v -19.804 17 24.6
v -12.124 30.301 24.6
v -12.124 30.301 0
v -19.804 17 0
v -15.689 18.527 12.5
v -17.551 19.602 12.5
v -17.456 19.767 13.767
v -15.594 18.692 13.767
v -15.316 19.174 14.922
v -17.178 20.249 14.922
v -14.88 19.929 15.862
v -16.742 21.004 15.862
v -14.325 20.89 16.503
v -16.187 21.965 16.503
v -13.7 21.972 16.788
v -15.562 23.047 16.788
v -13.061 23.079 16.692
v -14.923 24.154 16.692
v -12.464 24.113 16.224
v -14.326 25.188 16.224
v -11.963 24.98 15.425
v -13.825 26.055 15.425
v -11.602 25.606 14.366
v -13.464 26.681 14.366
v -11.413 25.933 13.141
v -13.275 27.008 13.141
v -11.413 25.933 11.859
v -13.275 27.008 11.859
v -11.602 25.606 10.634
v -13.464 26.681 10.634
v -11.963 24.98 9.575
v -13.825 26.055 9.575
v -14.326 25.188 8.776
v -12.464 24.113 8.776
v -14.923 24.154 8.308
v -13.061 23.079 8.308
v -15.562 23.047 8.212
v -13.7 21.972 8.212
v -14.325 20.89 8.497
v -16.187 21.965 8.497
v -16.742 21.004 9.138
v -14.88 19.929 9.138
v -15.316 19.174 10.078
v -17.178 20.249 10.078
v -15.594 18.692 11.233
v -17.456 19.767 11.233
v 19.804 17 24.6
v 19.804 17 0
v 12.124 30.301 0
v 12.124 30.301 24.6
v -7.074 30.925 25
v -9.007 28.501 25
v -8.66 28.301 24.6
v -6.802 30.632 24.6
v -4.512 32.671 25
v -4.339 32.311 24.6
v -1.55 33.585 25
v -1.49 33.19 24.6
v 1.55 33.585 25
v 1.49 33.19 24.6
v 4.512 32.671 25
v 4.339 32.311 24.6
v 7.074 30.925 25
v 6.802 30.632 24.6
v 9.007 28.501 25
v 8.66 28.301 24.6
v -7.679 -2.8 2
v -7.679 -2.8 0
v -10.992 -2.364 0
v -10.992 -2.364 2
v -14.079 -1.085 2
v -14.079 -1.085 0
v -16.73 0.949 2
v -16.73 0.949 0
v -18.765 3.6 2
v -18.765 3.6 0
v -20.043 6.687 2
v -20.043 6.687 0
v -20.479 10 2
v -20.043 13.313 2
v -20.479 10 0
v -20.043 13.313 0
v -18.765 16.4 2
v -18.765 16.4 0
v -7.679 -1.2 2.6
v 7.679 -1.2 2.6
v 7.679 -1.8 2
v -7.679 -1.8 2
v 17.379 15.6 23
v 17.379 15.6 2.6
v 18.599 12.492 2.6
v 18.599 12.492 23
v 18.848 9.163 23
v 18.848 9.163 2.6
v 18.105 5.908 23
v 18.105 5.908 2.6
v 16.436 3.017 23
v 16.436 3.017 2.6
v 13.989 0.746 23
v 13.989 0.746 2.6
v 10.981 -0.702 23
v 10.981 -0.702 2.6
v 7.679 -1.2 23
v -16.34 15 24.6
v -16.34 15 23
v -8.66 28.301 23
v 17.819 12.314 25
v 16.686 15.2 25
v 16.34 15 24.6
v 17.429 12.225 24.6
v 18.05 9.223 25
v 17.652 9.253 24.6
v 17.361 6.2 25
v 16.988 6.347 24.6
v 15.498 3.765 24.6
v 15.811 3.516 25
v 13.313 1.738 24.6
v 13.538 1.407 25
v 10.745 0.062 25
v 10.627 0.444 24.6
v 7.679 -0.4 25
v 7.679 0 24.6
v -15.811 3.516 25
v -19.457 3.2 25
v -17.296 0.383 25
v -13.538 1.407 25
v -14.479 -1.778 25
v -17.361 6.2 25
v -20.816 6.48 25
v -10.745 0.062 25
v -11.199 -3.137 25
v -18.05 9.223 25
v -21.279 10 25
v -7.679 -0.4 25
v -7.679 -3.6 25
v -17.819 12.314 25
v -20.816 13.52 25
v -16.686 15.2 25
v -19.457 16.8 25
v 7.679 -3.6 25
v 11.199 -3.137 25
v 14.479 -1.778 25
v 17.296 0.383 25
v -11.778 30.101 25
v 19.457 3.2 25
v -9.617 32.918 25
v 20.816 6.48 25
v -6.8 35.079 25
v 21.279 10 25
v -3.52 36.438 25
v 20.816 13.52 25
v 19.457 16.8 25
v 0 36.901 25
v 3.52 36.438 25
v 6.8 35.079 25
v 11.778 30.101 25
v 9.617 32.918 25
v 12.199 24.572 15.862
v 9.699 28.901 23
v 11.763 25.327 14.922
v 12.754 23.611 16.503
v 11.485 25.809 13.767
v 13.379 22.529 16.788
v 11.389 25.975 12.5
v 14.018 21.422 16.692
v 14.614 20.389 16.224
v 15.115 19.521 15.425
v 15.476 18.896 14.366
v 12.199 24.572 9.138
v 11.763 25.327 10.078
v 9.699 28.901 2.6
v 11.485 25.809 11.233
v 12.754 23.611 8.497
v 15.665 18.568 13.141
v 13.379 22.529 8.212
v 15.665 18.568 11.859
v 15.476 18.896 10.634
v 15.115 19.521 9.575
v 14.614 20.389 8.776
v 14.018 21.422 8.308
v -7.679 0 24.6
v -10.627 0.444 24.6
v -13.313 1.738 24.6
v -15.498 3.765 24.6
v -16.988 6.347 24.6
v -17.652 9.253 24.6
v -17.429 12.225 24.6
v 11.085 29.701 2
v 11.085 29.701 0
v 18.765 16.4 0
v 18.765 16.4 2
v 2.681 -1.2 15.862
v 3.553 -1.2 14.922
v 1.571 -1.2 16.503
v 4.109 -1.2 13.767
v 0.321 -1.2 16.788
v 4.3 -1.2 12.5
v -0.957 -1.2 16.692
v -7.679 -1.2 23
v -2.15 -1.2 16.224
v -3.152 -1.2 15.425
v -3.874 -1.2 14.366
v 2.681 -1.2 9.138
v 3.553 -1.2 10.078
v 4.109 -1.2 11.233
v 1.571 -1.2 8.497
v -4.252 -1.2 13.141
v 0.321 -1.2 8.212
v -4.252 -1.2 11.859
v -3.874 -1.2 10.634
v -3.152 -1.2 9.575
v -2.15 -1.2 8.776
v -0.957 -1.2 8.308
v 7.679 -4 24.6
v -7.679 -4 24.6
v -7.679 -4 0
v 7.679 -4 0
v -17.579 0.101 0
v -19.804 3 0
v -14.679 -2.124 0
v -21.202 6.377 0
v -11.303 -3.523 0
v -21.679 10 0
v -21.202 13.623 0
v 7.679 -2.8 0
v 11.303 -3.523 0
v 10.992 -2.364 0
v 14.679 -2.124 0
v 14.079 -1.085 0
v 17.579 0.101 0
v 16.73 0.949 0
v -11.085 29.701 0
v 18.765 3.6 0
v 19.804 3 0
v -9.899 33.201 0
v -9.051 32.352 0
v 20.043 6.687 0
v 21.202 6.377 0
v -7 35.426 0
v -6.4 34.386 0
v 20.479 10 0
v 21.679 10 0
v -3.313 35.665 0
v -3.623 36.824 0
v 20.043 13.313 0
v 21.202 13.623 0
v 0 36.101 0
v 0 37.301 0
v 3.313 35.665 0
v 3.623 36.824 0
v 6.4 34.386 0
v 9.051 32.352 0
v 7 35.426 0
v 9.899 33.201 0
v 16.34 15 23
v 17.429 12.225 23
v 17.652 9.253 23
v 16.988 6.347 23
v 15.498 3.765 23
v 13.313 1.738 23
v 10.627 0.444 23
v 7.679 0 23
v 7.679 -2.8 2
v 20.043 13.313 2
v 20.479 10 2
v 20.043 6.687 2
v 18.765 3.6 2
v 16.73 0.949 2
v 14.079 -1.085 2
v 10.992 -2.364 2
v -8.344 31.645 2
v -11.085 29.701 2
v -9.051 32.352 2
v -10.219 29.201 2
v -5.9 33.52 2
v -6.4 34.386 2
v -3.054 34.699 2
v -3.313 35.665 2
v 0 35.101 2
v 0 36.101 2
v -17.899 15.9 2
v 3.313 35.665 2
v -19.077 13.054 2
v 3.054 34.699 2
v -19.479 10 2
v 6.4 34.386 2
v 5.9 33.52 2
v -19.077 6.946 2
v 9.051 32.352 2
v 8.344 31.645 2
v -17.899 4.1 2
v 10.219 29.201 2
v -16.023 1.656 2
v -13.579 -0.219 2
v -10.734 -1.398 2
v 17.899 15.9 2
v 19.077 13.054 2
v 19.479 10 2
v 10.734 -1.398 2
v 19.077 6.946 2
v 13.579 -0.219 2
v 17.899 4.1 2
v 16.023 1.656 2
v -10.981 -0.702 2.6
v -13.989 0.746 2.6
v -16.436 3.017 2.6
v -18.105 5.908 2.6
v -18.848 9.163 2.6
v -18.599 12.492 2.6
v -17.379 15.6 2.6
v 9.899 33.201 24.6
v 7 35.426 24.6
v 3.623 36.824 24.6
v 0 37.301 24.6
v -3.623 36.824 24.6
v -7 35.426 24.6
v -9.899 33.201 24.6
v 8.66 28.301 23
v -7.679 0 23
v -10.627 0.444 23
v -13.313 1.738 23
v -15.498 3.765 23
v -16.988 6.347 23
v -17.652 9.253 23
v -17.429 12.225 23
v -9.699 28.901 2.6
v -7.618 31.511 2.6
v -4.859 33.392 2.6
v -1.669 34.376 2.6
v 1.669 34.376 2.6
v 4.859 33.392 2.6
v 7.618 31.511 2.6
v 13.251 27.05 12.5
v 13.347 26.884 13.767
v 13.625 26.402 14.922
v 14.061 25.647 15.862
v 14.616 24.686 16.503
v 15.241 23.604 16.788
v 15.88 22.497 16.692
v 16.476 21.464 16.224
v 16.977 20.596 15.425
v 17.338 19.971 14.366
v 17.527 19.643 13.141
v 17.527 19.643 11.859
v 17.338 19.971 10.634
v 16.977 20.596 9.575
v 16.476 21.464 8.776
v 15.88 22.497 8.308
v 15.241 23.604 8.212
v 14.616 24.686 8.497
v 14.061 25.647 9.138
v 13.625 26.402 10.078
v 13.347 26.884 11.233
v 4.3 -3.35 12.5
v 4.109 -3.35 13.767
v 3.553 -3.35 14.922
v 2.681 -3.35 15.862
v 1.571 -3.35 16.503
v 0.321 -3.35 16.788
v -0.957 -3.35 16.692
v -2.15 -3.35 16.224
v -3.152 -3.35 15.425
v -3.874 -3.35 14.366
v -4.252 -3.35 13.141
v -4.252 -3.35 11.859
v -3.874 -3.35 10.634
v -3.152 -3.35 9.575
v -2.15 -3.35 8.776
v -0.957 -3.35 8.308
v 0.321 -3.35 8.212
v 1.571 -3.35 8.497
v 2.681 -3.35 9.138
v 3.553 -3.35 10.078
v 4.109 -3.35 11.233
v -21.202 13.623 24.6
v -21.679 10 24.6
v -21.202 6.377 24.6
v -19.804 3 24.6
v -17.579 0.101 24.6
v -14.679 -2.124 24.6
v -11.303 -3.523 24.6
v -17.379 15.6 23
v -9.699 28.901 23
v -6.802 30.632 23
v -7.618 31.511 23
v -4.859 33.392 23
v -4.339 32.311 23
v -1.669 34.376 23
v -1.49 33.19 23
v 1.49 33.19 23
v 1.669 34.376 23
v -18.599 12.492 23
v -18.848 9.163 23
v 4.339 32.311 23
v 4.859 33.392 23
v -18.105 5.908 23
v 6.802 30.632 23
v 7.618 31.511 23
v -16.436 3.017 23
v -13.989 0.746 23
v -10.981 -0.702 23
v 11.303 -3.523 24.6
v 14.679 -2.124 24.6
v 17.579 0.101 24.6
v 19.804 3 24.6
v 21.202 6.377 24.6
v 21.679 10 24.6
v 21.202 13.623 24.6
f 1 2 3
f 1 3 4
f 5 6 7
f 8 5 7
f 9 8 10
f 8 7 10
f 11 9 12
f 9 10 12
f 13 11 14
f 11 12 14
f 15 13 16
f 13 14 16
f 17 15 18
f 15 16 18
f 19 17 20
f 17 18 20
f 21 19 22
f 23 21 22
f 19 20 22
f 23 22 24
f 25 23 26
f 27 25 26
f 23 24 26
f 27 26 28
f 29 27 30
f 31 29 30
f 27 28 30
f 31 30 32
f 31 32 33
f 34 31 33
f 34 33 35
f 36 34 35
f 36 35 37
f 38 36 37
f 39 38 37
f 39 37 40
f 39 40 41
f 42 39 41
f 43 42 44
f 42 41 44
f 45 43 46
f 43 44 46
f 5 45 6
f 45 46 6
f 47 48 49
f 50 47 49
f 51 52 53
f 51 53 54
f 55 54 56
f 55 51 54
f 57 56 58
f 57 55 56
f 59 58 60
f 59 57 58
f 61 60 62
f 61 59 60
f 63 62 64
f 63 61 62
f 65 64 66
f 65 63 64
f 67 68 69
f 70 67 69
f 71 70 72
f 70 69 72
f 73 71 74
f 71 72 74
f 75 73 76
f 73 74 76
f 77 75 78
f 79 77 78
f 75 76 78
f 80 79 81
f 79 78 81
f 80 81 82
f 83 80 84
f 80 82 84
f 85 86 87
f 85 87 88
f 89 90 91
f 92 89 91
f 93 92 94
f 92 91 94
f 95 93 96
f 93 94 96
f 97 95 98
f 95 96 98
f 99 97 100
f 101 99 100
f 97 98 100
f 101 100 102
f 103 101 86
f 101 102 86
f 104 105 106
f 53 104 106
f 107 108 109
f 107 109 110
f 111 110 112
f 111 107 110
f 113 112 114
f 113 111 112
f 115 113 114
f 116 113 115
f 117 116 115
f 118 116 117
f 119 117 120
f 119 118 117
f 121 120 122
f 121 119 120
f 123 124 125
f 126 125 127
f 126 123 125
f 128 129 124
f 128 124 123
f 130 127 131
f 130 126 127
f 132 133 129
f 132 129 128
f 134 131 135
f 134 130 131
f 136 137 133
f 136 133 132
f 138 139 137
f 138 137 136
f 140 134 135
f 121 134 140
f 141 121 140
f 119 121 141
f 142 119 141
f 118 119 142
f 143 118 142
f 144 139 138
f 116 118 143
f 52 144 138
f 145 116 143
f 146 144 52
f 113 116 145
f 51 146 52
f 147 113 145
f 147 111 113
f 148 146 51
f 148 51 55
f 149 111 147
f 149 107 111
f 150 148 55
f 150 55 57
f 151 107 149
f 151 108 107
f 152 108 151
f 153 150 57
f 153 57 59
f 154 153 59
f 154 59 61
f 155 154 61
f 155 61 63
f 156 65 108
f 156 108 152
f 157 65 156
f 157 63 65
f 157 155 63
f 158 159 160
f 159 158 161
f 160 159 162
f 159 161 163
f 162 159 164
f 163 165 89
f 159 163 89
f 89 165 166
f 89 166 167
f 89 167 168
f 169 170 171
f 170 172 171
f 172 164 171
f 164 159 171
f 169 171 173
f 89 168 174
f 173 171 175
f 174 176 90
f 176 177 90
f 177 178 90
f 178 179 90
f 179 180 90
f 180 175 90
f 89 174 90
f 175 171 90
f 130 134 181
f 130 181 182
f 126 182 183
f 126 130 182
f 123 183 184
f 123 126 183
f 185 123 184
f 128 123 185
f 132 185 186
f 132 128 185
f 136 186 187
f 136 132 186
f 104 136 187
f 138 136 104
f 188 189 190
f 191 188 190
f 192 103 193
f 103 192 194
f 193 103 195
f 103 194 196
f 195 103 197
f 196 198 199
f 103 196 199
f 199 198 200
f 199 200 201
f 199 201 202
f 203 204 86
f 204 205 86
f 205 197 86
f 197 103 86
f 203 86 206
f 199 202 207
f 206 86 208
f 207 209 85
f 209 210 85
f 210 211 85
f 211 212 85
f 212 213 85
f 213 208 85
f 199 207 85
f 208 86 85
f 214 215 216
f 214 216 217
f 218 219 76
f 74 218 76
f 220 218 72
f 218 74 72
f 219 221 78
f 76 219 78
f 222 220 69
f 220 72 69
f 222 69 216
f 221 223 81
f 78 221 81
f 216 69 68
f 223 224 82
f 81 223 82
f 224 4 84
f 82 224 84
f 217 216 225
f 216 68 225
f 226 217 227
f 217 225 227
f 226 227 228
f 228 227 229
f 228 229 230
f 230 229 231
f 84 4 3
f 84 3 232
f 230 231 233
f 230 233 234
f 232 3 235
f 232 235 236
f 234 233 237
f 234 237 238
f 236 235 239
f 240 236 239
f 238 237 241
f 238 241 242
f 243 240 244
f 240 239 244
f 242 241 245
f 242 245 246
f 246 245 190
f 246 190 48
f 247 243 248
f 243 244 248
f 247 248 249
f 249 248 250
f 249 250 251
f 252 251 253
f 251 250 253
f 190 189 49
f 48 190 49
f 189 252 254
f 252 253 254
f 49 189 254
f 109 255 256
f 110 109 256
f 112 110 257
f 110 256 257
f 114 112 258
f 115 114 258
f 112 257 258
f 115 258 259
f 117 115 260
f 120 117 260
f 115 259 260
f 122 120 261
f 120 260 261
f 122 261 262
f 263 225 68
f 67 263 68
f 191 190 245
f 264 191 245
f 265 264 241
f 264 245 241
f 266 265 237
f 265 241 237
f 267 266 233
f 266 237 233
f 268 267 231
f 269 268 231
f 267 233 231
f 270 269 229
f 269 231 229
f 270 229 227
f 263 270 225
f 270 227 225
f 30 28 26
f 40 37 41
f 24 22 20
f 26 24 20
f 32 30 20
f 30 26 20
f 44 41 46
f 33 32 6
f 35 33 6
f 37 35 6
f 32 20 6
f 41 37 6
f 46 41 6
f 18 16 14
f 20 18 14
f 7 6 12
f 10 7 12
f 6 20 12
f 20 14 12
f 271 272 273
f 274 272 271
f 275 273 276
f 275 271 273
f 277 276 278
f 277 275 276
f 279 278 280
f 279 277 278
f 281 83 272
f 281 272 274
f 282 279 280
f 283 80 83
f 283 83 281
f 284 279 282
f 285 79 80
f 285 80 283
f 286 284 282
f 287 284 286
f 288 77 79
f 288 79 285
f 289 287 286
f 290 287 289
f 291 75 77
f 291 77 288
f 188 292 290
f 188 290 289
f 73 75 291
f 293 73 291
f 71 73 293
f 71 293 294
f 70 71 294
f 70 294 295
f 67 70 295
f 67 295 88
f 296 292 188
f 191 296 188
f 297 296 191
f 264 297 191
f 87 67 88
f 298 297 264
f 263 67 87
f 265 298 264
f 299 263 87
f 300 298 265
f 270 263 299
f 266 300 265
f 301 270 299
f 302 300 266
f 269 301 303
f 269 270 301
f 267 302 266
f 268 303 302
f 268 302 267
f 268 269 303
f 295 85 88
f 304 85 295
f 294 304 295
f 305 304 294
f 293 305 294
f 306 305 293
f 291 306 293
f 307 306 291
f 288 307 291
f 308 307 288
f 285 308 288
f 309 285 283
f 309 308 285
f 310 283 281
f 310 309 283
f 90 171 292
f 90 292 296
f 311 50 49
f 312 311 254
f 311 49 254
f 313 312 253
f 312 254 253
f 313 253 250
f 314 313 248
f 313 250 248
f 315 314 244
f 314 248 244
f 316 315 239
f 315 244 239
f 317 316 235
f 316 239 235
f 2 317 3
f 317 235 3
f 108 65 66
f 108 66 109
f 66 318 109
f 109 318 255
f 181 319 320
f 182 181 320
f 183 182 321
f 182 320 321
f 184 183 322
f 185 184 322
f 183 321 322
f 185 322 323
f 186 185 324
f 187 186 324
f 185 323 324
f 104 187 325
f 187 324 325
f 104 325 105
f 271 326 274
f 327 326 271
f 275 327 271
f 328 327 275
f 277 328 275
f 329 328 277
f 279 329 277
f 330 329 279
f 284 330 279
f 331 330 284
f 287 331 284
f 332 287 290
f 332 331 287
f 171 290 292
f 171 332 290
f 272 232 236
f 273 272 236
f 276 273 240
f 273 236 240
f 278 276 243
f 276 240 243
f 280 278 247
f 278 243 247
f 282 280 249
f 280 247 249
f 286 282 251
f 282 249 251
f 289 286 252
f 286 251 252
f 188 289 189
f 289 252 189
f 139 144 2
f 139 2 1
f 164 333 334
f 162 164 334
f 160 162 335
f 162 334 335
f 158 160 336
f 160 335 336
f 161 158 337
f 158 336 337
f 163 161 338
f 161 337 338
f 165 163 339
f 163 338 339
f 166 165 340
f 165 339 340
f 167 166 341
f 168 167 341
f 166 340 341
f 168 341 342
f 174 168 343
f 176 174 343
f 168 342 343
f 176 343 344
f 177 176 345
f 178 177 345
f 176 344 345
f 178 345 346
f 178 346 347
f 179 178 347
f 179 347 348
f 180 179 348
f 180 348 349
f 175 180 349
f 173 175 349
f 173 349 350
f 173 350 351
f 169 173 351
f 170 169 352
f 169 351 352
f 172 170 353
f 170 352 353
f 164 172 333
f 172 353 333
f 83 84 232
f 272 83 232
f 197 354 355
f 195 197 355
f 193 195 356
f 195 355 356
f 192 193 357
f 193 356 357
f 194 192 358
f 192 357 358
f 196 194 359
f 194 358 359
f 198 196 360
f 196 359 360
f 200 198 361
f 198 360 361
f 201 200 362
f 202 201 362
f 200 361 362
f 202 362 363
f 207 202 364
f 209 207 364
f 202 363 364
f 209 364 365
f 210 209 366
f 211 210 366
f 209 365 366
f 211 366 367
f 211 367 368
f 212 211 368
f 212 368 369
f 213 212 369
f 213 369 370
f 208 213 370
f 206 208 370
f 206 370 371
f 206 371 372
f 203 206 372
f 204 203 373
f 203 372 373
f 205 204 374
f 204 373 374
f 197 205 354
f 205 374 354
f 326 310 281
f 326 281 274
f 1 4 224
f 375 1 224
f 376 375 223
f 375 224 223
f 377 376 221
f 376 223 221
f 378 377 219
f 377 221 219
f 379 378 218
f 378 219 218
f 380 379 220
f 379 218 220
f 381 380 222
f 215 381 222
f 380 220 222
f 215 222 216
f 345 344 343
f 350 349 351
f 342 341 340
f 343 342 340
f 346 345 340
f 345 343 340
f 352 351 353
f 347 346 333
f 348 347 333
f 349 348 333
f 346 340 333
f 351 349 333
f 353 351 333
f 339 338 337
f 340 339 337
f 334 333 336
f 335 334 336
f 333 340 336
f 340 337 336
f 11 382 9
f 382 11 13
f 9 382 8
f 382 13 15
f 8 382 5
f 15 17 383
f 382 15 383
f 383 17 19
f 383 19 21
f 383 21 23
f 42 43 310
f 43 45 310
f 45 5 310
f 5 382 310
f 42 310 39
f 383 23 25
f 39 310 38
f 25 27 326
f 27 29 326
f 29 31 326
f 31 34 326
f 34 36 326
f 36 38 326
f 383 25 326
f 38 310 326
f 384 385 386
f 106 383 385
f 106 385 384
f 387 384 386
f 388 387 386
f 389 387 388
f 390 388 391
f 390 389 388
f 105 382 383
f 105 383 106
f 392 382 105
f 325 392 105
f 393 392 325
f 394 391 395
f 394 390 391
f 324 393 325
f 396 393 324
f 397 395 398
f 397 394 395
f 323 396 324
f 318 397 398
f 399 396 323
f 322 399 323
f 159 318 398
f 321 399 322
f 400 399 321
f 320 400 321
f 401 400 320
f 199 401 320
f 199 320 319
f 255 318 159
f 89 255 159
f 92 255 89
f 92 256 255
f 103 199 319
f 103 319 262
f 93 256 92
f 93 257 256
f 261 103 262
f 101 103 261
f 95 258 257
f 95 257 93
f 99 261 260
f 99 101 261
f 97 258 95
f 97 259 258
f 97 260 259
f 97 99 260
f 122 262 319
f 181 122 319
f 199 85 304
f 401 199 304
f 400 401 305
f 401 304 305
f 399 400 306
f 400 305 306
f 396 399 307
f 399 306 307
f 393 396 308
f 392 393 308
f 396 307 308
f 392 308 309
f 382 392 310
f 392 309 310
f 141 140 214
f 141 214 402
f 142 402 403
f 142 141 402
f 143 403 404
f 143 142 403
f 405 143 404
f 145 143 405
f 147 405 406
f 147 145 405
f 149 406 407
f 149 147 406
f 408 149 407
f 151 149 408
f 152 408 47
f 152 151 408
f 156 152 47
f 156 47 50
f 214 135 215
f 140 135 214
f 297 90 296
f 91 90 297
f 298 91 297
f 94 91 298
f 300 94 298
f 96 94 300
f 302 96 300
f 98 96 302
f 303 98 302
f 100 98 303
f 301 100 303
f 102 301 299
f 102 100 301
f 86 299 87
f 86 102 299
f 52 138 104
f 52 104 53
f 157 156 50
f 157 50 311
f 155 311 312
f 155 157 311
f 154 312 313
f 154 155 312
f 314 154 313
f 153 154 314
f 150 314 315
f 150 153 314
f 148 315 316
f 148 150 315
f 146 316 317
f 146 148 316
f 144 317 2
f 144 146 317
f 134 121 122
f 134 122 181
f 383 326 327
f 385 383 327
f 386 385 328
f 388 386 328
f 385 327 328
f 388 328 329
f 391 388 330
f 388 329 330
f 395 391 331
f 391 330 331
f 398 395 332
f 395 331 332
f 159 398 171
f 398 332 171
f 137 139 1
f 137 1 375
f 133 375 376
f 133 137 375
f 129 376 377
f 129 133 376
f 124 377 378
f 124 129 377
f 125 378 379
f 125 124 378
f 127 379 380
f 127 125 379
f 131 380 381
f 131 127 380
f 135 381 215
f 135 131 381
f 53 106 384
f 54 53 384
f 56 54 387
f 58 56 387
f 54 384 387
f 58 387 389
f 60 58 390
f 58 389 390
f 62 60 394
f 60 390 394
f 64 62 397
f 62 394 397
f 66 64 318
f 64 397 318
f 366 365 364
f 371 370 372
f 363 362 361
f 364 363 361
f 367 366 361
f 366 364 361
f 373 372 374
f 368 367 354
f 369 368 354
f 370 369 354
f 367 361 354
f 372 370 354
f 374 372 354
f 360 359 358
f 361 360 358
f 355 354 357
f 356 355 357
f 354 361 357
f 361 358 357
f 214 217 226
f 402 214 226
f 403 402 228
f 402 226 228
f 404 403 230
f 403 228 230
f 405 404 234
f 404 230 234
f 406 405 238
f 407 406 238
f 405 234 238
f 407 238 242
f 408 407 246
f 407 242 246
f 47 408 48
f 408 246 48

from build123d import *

# Parameters (mm, degrees)
F1_DEPTH        = 25
F3_START        = -0.65
F2_R            = 4.3
F3_DEPTH        = 2.15
F3_COPIES_COUNT = 3
F6_DEPTH        = 23
F8_DEPTH        = 2
F9_SIZE         = 0.6
F10_SIZE        = 0.4


# Not quite as in the source:
# - a pattern or mirror of a feature is missing from the dataset's text; its kind, count and spacing are read off the source's solid


with BuildPart() as f1:
    # F0 (on Top) → F1 (new body)
    with BuildSketch(Plane.XY):
        with BuildLine():
            ThreePointArc((7.6794919243, -4), (19.8038475773, 3), (19.8038475773, 17))
            Line((19.8038475773, 17), (12.124355653, 30.3012701892))
            ThreePointArc((12.124355653, 30.3012701892), (0, 37.3012701892), (-12.124355653, 30.3012701892))
            Line((-12.124355653, 30.3012701892), (-19.8038475773, 17))
            ThreePointArc((-19.8038475773, 17), (-19.8038475773, 3), (-7.6794919243, -4))
            Line((-7.6794919243, -4), (0, -4))
            Line((0, -4), (7.6794919243, -4))
        make_face()
        with BuildLine():
            Line((7.6794919243, 0), (0, 0))
            Line((0, 0), (-7.6794919243, 0))
            ThreePointArc((-7.6794919243, 0), (-16.3397459622, 5), (-16.3397459622, 15))
            Line((-16.3397459622, 15), (-8.6602540378, 28.3012701892))
            ThreePointArc((-8.6602540378, 28.3012701892), (0, 33.3012701892), (8.6602540378, 28.3012701892))
            Line((8.6602540378, 28.3012701892), (16.3397459622, 15))
            ThreePointArc((16.3397459622, 15), (16.3397459622, 5), (7.6794919243, 0))
        make_face(mode=Mode.SUBTRACT)
    extrude(amount=F1_DEPTH)

    # F2 (on face) → F3 (cut)
    with BuildSketch(Plane(origin=(-22.2141016151, 12.8253175473, 0), x_dir=(-0.5, -0.8660254038, 0), z_dir=(-0.8660254038, 0.5, 0)).offset(F3_START)):
        with Locations((-12.5, 12.5)):
            Circle(F2_R)
    f3 = extrude(amount=-F3_DEPTH, mode=Mode.SUBTRACT)

    # F3_copies: F3 ×3 about axis
    f3_copies_axis = Axis((0, 14.433757, 0), (0, 0, 1))
    for i in range(1, F3_COPIES_COUNT):
        add(f3.rotate(f3_copies_axis, i * 360 / F3_COPIES_COUNT), mode=Mode.SUBTRACT)

    # F5 (on face) → F6 (cut)
    with BuildSketch(Plane(origin=(0, 0, 0), x_dir=(1, 0, 0), z_dir=(0, 0, -1))):
        with BuildLine():
            Line((9.6994845224, -28.9012701892), (17.3789764467, -15.6))
            ThreePointArc((17.3789764467, -15.6), (17.3789764467, -4.4), (7.6794919243, 1.2))
            Line((7.6794919243, 1.2), (-7.6794919243, 1.2))
            ThreePointArc((-7.6794919243, 1.2), (-17.3789764467, -4.4), (-17.3789764467, -15.6))
            Line((-17.3789764467, -15.6), (-9.6994845224, -28.9012701892))
            ThreePointArc((-9.6994845224, -28.9012701892), (0, -34.5012701892), (9.6994845224, -28.9012701892))
        make_face()
    extrude(amount=-F6_DEPTH, mode=Mode.SUBTRACT)

    # F7 (on face) → F8 (cut)
    with BuildSketch(Plane(origin=(0, 0, 0), x_dir=(1, 0, 0), z_dir=(0, 0, -1))):
        with BuildLine():
            Line((11.0851251684, -29.7012701892), (18.7646170928, -16.4))
            ThreePointArc((18.7646170928, -16.4), (18.7646170928, -3.6), (7.6794919243, 2.8))
            Line((7.6794919243, 2.8), (-7.6794919243, 2.8))
            ThreePointArc((-7.6794919243, 2.8), (-18.7646170928, -3.6), (-18.7646170928, -16.4))
            Line((-18.7646170928, -16.4), (-11.0851251684, -29.7012701892))
            ThreePointArc((-11.0851251684, -29.7012701892), (0, -36.1012701892), (11.0851251684, -29.7012701892))
        make_face()
    extrude(amount=-F8_DEPTH, mode=Mode.SUBTRACT)

    # F9
    f9_edges = [f1.edges().sort_by_distance(p)[0] for p in [
        (0, 34.50127, 2),
        (13.53923, 22.250635, 2),
        (17.378976, 4.4, 2),
        (0, -1.2, 2),
        (-17.378976, 4.4, 2),
        (-13.53923, 22.250635, 2),
    ]]
    chamfer(f9_edges, length=F9_SIZE)

    # F10
    f10_edges = [f1.edges().sort_by_distance(p)[0] for p in [
        (19.803848, 3, 25),
        (12.5, 21.650635, 25),
        (0, -4, 25),
        (-19.803848, 3, 25),
        (-15.964102, 23.650635, 25),
        (15.964102, 23.650635, 25),
        (0, 37.30127, 25),
        (16.339746, 5, 25),
        (0, 0, 25),
        (-16.339746, 5, 25),
        (-12.5, 21.650635, 25),
        (0, 33.30127, 25),
    ]]
    chamfer(f10_edges, length=F10_SIZE)


solid = f1.part
